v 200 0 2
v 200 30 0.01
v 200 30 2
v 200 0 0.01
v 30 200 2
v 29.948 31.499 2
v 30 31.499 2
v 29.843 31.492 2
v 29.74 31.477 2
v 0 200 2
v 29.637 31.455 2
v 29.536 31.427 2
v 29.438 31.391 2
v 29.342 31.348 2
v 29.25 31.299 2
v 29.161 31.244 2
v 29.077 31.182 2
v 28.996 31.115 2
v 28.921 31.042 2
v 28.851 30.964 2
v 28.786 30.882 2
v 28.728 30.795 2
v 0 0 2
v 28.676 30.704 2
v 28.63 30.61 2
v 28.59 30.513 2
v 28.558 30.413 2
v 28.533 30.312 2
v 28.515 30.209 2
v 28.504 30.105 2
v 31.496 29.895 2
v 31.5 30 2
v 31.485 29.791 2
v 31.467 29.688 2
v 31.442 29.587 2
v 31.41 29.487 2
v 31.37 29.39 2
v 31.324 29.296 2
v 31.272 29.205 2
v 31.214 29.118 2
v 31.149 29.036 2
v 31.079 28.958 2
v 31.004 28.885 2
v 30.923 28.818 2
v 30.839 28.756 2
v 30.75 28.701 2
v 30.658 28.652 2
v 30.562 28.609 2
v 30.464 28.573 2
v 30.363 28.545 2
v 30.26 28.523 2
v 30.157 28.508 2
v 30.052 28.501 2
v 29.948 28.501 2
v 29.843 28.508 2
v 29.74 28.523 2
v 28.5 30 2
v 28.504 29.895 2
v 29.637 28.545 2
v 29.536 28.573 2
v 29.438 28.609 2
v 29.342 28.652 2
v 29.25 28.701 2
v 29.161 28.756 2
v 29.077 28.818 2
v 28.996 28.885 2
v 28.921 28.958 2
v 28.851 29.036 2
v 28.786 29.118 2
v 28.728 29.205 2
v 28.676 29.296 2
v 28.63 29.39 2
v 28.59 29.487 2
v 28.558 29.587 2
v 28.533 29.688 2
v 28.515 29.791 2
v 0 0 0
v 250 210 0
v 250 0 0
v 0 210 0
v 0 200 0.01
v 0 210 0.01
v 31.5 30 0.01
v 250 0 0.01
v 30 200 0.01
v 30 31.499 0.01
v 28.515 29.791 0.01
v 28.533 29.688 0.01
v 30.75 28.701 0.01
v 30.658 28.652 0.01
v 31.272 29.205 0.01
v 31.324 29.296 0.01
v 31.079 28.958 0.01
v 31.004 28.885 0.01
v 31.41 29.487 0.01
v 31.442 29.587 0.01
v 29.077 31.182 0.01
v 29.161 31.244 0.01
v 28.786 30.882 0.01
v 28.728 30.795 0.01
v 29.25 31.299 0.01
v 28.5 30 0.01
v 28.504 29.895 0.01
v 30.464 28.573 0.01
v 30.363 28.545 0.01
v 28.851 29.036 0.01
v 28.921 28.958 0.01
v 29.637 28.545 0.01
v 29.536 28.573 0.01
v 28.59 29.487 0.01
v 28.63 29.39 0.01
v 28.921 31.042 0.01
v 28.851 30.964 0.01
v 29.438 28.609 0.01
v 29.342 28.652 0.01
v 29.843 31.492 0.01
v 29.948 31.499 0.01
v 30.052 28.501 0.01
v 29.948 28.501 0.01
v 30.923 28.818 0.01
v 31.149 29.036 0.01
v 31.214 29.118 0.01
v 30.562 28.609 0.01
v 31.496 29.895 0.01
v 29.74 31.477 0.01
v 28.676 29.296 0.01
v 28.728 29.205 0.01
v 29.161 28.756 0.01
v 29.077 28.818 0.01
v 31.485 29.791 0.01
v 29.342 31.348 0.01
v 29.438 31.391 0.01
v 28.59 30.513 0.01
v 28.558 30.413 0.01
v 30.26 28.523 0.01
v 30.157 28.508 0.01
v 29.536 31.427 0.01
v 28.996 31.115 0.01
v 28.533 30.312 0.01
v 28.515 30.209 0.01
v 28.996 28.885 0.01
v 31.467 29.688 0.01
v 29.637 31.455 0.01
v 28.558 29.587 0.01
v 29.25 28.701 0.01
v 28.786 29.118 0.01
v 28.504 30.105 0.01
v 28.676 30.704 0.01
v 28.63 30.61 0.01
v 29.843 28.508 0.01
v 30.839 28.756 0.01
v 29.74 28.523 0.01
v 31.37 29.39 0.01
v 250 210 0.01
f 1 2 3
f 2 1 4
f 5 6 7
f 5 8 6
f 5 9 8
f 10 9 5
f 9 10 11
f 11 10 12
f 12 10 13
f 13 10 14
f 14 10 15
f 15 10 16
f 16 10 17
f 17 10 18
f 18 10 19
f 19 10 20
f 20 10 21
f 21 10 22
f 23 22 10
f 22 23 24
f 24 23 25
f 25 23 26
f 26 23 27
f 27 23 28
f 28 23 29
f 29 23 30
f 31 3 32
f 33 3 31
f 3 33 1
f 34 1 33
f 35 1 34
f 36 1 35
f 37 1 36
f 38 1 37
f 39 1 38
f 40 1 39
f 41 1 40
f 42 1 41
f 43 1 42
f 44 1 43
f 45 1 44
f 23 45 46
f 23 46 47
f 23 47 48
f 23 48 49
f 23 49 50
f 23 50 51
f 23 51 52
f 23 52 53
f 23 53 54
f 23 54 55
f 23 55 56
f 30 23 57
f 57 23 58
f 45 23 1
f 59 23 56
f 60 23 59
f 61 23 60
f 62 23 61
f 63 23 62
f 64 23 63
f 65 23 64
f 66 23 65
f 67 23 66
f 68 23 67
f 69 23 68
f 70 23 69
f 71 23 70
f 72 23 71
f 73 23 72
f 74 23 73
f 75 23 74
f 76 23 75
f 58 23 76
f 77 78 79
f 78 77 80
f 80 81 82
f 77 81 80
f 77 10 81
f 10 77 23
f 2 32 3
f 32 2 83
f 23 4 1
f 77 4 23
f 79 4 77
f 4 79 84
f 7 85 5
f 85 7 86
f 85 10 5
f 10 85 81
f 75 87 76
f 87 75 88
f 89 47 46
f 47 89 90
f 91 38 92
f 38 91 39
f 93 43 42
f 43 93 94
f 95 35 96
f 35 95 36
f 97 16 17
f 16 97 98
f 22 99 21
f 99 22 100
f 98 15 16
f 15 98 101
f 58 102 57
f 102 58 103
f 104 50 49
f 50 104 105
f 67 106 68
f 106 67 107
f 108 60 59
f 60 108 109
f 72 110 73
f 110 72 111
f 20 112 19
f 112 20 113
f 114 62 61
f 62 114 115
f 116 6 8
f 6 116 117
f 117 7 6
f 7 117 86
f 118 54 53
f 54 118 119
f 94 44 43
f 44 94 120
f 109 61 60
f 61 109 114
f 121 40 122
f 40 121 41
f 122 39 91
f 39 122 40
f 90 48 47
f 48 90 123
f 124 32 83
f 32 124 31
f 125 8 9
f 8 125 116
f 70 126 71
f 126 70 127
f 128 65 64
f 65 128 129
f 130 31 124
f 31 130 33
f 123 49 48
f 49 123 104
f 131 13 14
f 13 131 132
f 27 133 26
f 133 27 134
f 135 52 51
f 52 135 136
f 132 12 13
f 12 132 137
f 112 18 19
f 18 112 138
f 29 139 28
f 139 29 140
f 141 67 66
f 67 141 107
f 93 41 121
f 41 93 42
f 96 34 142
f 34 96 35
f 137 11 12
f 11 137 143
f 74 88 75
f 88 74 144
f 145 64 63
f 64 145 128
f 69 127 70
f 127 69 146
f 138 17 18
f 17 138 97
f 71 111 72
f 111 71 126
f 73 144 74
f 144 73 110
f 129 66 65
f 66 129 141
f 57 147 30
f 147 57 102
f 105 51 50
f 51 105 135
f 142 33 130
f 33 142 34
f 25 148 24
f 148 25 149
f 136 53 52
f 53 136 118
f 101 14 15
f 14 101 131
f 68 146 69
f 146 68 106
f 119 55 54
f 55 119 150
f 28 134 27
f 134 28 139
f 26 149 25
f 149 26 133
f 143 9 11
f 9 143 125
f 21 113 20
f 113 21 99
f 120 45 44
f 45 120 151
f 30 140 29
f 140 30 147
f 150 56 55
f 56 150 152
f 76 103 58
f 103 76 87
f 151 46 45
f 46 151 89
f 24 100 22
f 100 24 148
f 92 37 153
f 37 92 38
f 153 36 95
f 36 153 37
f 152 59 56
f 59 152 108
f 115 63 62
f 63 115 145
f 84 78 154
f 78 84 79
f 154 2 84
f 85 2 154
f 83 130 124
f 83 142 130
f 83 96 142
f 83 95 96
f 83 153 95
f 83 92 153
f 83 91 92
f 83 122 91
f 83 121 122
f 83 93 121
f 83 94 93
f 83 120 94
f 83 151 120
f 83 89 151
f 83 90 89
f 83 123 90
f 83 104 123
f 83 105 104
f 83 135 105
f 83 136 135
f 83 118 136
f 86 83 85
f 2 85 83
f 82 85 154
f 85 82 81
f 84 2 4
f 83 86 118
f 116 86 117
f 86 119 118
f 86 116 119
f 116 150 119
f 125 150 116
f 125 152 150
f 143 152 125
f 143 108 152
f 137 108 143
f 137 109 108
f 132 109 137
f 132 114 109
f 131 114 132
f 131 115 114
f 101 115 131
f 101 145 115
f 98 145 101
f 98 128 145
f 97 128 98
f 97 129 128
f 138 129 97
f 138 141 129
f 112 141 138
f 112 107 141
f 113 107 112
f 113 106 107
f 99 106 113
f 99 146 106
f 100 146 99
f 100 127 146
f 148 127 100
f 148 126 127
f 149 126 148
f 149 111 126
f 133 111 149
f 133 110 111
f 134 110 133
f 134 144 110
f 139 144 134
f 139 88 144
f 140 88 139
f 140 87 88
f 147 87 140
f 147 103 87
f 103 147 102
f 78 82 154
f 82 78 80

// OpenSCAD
$fn=90;

length = 200;
width = 30;
height = 2;

difference(){
	union(){
		cube([length, width, height]);
		cube([width, length, height]);
	}
	translate([width, width, -0.5])
		#cylinder(h=height+1, d=3);
}

//printer plate
#cube([250, 210, 0.01]);
